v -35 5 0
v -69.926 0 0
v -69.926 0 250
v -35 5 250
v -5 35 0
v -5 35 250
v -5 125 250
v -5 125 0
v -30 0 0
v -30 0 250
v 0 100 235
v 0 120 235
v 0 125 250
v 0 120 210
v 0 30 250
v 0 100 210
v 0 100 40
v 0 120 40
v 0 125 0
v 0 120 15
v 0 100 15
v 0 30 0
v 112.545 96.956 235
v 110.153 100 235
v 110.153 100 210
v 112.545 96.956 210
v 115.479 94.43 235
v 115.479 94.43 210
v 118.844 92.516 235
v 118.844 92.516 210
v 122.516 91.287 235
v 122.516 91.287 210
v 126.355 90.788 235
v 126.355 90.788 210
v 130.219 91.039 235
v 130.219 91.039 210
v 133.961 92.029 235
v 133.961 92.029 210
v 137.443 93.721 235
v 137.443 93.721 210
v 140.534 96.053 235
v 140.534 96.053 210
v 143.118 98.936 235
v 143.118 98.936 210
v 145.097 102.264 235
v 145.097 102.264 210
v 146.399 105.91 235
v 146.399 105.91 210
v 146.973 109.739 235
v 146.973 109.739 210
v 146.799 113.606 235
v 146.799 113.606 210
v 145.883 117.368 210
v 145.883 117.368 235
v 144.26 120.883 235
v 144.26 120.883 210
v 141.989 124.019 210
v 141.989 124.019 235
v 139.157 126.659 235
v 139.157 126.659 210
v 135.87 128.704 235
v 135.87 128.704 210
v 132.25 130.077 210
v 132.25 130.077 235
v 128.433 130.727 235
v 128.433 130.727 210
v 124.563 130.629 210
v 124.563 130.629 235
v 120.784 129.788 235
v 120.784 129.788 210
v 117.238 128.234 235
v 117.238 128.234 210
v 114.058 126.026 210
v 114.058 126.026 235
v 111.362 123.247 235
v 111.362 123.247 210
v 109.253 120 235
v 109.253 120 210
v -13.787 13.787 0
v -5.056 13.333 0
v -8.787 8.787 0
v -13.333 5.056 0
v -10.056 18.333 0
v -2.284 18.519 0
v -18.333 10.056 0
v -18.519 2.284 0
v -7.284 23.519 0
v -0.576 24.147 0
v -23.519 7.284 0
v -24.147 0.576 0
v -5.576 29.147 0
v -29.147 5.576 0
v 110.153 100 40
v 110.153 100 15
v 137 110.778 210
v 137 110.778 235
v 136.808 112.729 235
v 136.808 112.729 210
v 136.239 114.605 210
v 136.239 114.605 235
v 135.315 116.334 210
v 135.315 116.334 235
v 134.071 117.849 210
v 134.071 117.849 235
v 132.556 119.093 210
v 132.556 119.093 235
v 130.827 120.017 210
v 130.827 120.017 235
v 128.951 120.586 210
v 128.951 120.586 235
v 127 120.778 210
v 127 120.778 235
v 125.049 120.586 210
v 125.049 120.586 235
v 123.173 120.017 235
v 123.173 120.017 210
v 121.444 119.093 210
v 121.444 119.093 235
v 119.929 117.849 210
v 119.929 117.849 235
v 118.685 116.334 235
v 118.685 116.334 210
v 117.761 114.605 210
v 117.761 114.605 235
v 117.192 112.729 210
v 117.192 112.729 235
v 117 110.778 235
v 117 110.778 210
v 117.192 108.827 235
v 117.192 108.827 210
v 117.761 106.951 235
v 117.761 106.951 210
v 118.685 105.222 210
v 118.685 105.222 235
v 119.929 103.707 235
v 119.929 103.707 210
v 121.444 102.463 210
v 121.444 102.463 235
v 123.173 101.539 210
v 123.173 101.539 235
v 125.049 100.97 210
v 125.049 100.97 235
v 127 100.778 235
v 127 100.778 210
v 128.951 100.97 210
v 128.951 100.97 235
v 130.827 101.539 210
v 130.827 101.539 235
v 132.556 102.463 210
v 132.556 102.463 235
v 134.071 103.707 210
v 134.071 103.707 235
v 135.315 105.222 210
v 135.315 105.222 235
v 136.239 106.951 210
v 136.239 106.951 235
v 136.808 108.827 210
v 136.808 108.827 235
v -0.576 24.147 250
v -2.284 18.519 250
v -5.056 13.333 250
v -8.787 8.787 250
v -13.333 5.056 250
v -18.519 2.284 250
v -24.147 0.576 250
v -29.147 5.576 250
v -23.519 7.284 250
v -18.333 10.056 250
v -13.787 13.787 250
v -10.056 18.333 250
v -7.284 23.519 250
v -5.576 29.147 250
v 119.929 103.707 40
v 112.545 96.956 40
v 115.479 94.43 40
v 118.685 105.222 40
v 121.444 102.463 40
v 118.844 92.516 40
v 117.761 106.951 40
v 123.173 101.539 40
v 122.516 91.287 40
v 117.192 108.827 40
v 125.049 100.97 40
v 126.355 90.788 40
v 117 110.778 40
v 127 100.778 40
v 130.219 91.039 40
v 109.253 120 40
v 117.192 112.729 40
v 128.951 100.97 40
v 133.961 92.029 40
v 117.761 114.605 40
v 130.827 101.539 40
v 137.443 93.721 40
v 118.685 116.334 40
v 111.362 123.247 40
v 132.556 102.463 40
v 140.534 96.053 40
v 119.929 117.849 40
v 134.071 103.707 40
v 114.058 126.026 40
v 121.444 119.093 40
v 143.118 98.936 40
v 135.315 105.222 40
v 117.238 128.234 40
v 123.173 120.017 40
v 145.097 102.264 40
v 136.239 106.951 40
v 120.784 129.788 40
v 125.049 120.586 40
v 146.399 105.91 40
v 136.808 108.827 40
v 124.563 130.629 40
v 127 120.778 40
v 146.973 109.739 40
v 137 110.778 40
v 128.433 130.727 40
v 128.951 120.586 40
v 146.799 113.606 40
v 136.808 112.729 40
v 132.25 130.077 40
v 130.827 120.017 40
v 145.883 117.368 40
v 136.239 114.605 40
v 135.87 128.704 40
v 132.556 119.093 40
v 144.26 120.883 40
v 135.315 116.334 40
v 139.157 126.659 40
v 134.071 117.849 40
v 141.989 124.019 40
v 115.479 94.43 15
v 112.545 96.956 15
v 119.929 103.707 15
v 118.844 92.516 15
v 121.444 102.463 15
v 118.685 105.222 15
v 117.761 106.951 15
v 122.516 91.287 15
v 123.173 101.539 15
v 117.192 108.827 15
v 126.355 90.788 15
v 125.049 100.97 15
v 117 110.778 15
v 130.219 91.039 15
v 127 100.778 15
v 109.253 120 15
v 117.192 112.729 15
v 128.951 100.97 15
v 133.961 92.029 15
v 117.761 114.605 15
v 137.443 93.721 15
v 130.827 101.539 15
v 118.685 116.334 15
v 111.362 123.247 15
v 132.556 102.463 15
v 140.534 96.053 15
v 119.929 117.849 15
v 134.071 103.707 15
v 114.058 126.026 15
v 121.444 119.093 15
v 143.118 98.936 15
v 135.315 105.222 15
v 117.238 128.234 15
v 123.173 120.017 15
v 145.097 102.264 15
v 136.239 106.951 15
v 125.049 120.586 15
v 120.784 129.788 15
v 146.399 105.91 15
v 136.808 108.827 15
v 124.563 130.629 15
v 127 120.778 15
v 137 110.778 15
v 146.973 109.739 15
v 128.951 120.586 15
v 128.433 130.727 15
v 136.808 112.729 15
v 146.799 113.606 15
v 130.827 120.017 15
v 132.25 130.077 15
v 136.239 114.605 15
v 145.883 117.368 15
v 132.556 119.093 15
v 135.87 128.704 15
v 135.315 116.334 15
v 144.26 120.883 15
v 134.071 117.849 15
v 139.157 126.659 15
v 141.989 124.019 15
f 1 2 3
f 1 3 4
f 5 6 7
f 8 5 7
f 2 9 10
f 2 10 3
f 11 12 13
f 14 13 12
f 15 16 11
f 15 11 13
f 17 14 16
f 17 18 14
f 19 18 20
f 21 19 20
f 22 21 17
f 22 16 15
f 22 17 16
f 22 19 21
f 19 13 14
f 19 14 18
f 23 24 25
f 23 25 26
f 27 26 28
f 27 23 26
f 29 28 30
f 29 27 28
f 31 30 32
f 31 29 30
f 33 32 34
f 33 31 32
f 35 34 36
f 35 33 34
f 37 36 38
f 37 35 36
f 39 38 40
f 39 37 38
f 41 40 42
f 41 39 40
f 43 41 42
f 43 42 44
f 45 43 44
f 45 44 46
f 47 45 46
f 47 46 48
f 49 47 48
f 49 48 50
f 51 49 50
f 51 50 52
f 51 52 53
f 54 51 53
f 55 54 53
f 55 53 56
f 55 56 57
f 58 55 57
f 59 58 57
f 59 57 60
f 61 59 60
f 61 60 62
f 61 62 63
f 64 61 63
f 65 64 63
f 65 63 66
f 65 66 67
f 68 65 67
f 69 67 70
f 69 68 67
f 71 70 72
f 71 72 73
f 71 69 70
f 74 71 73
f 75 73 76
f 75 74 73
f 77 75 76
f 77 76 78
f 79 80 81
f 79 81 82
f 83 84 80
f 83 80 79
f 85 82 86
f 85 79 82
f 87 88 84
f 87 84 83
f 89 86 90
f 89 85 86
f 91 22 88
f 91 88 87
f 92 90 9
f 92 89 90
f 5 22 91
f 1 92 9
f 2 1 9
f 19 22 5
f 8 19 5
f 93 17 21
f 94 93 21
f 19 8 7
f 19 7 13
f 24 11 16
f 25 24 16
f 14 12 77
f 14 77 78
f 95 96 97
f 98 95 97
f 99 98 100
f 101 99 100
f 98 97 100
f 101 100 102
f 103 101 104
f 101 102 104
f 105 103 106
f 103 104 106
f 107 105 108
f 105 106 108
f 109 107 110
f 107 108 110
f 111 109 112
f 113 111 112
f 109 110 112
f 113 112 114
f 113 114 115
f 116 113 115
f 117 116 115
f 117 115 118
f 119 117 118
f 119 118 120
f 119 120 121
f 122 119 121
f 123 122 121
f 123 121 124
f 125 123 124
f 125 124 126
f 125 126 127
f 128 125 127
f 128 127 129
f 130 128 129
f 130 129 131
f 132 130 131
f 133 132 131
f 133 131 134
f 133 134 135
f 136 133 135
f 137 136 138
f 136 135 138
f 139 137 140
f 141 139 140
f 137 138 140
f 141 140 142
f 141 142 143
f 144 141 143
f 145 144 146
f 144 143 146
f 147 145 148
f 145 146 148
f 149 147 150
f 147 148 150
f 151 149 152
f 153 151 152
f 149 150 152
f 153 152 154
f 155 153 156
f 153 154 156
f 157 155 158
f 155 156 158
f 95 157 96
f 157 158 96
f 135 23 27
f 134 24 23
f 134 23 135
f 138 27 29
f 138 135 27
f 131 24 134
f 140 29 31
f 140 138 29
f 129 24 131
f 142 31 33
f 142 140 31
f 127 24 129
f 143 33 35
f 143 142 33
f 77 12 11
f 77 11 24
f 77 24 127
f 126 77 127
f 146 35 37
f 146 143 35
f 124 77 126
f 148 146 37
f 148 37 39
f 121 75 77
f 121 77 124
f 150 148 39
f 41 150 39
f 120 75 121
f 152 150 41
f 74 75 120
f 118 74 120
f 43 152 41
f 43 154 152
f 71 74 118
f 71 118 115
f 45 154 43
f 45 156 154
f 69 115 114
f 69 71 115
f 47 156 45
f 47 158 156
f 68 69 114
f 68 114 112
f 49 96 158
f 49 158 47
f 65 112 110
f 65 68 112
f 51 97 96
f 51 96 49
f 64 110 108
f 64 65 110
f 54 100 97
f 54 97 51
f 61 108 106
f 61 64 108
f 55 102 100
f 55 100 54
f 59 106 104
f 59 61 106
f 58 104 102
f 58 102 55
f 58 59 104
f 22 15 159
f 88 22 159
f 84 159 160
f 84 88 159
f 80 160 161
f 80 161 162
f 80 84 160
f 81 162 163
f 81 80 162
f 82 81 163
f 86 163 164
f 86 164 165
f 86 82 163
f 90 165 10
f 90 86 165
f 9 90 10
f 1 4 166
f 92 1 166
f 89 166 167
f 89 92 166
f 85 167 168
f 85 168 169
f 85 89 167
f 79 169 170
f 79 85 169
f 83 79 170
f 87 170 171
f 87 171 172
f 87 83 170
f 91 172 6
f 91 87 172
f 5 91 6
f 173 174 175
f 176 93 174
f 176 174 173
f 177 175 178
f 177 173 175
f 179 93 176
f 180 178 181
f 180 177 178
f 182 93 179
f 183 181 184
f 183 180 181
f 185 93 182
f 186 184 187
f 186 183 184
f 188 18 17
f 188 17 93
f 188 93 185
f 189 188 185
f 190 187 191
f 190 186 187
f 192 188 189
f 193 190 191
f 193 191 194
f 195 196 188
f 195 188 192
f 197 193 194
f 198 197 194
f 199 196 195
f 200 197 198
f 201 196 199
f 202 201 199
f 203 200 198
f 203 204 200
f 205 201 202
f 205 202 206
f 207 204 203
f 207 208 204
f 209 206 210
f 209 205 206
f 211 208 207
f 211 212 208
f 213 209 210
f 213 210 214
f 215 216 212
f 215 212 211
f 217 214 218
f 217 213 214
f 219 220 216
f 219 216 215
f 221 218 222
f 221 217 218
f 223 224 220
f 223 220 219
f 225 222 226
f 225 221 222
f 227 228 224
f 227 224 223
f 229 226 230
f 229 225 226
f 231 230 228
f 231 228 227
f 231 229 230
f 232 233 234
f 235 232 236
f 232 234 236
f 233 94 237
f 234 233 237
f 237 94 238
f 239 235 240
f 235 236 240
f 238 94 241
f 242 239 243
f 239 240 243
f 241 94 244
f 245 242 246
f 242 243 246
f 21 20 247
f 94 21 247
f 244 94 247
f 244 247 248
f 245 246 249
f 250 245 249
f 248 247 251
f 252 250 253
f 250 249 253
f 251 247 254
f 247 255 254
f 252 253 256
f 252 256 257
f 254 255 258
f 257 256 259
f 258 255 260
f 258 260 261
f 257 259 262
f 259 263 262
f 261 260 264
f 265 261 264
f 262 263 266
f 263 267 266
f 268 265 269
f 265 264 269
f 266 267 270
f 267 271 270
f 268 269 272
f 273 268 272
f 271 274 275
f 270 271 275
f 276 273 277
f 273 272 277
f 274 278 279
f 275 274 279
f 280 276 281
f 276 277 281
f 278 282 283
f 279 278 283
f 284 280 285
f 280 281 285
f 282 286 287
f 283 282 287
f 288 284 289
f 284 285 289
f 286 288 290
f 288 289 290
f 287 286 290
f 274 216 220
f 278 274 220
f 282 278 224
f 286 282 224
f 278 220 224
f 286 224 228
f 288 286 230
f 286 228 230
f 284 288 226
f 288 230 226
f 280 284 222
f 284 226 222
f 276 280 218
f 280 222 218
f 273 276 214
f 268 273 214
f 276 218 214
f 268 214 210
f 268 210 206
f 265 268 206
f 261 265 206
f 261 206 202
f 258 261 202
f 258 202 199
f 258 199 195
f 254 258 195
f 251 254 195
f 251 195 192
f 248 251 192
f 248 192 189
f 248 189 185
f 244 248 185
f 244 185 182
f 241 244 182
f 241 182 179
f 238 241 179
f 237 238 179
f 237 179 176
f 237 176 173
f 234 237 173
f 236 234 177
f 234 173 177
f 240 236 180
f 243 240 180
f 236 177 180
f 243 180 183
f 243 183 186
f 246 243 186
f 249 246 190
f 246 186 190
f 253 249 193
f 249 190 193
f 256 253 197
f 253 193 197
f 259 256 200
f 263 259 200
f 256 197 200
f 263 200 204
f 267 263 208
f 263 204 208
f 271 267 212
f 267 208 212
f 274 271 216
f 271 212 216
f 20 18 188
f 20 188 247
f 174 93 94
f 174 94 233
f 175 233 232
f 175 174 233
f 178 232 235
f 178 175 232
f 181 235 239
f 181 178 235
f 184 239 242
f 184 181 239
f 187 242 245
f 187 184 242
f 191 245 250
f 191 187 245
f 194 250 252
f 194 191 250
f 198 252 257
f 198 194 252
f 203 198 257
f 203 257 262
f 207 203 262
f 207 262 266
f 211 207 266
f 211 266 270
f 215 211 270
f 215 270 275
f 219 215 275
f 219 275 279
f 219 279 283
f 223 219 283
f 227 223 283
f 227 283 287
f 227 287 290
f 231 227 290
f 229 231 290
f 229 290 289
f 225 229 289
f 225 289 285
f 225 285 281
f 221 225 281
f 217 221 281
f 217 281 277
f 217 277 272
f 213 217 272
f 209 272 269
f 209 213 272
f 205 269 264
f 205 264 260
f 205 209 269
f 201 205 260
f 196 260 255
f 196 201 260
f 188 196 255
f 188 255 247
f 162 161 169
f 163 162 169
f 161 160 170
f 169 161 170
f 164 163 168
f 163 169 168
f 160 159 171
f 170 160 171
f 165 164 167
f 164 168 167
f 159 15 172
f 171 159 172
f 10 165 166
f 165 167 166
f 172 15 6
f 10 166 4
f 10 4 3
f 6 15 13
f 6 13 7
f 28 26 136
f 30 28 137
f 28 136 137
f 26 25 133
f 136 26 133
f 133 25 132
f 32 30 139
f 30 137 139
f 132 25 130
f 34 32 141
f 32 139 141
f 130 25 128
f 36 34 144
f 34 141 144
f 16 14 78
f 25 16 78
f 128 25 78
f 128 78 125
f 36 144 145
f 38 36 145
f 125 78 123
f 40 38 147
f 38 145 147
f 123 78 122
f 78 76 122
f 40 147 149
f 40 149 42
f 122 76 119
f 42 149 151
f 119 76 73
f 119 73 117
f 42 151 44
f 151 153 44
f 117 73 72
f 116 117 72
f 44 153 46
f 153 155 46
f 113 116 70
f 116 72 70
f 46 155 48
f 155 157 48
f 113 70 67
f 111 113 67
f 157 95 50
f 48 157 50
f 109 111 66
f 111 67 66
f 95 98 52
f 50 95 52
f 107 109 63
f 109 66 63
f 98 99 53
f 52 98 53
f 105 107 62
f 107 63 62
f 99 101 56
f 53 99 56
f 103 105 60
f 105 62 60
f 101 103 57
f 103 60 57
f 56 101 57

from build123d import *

# Parameters (mm, degrees)
BOSS_EXTRU_1_DEPTH      = 250
ESQUISSE3_W             = 25
ESQUISSE3_H             = 20
BOSS_EXTRU_2_DEPTH      = 125
ESQUISSE4_R             = 20
BOSS_EXTRU_3_DEPTH      = 25
ESQUISSE5_R             = 20
BOSS_EXTRU_4_DEPTH      = 25
ESQUISSE6_R             = 10
ENL_V_MAT_EXTRU_1_DEPTH = 236


with BuildPart() as part:
    # Esquisse1 → Boss.-Extru.1 (new body)
    with BuildSketch(Plane.XY):
        with BuildLine():
            Line((-30, 0), (-69.925793841, 0))
            Line((-69.925793841, 0), (-35, 5))
            ThreePointArc((-35, 5), (-13.786796564, 13.786796564), (-5, 35))
            Line((-5, 35), (-5, 125))
            Line((-5, 125), (0, 125))
            Line((0, 125), (0, 30))
            ThreePointArc((0, 30), (-8.786796564, 8.786796564), (-30, 0))
        make_face()
    extrude(amount=BOSS_EXTRU_1_DEPTH)

    # Esquisse3 → Boss.-Extru.2 (add)
    with BuildSketch(Plane(origin=(0, 0, 0), x_dir=(0, 0, -1), z_dir=(1, 0, 0))):
        with Locations((-222.5, 110)):
            Rectangle(ESQUISSE3_W, ESQUISSE3_H)
        with Locations((-27.5, 110)):
            Rectangle(ESQUISSE3_W, ESQUISSE3_H)
    extrude(amount=BOSS_EXTRU_2_DEPTH)

    # Esquisse4 → Boss.-Extru.3 (add)
    with BuildSketch(Plane.XY.offset(235)):
        with Locations((127, 110.778032317)):
            Circle(ESQUISSE4_R)
    extrude(amount=-BOSS_EXTRU_3_DEPTH)

    # Esquisse5 → Boss.-Extru.4 (add)
    with BuildSketch(Plane.XY.offset(40)):
        with Locations((127, 110.778032317)):
            Circle(ESQUISSE5_R)
    extrude(amount=-BOSS_EXTRU_4_DEPTH)

    # Esquisse6 → Enlèv. mat.-Extru.1 (cut, through all)
    with BuildSketch(Plane.XY.offset(235)):
        with Locations((127, 110.778032317)):
            Circle(ESQUISSE6_R)
    extrude(amount=-ENL_V_MAT_EXTRU_1_DEPTH, mode=Mode.SUBTRACT)


solid = part.part
